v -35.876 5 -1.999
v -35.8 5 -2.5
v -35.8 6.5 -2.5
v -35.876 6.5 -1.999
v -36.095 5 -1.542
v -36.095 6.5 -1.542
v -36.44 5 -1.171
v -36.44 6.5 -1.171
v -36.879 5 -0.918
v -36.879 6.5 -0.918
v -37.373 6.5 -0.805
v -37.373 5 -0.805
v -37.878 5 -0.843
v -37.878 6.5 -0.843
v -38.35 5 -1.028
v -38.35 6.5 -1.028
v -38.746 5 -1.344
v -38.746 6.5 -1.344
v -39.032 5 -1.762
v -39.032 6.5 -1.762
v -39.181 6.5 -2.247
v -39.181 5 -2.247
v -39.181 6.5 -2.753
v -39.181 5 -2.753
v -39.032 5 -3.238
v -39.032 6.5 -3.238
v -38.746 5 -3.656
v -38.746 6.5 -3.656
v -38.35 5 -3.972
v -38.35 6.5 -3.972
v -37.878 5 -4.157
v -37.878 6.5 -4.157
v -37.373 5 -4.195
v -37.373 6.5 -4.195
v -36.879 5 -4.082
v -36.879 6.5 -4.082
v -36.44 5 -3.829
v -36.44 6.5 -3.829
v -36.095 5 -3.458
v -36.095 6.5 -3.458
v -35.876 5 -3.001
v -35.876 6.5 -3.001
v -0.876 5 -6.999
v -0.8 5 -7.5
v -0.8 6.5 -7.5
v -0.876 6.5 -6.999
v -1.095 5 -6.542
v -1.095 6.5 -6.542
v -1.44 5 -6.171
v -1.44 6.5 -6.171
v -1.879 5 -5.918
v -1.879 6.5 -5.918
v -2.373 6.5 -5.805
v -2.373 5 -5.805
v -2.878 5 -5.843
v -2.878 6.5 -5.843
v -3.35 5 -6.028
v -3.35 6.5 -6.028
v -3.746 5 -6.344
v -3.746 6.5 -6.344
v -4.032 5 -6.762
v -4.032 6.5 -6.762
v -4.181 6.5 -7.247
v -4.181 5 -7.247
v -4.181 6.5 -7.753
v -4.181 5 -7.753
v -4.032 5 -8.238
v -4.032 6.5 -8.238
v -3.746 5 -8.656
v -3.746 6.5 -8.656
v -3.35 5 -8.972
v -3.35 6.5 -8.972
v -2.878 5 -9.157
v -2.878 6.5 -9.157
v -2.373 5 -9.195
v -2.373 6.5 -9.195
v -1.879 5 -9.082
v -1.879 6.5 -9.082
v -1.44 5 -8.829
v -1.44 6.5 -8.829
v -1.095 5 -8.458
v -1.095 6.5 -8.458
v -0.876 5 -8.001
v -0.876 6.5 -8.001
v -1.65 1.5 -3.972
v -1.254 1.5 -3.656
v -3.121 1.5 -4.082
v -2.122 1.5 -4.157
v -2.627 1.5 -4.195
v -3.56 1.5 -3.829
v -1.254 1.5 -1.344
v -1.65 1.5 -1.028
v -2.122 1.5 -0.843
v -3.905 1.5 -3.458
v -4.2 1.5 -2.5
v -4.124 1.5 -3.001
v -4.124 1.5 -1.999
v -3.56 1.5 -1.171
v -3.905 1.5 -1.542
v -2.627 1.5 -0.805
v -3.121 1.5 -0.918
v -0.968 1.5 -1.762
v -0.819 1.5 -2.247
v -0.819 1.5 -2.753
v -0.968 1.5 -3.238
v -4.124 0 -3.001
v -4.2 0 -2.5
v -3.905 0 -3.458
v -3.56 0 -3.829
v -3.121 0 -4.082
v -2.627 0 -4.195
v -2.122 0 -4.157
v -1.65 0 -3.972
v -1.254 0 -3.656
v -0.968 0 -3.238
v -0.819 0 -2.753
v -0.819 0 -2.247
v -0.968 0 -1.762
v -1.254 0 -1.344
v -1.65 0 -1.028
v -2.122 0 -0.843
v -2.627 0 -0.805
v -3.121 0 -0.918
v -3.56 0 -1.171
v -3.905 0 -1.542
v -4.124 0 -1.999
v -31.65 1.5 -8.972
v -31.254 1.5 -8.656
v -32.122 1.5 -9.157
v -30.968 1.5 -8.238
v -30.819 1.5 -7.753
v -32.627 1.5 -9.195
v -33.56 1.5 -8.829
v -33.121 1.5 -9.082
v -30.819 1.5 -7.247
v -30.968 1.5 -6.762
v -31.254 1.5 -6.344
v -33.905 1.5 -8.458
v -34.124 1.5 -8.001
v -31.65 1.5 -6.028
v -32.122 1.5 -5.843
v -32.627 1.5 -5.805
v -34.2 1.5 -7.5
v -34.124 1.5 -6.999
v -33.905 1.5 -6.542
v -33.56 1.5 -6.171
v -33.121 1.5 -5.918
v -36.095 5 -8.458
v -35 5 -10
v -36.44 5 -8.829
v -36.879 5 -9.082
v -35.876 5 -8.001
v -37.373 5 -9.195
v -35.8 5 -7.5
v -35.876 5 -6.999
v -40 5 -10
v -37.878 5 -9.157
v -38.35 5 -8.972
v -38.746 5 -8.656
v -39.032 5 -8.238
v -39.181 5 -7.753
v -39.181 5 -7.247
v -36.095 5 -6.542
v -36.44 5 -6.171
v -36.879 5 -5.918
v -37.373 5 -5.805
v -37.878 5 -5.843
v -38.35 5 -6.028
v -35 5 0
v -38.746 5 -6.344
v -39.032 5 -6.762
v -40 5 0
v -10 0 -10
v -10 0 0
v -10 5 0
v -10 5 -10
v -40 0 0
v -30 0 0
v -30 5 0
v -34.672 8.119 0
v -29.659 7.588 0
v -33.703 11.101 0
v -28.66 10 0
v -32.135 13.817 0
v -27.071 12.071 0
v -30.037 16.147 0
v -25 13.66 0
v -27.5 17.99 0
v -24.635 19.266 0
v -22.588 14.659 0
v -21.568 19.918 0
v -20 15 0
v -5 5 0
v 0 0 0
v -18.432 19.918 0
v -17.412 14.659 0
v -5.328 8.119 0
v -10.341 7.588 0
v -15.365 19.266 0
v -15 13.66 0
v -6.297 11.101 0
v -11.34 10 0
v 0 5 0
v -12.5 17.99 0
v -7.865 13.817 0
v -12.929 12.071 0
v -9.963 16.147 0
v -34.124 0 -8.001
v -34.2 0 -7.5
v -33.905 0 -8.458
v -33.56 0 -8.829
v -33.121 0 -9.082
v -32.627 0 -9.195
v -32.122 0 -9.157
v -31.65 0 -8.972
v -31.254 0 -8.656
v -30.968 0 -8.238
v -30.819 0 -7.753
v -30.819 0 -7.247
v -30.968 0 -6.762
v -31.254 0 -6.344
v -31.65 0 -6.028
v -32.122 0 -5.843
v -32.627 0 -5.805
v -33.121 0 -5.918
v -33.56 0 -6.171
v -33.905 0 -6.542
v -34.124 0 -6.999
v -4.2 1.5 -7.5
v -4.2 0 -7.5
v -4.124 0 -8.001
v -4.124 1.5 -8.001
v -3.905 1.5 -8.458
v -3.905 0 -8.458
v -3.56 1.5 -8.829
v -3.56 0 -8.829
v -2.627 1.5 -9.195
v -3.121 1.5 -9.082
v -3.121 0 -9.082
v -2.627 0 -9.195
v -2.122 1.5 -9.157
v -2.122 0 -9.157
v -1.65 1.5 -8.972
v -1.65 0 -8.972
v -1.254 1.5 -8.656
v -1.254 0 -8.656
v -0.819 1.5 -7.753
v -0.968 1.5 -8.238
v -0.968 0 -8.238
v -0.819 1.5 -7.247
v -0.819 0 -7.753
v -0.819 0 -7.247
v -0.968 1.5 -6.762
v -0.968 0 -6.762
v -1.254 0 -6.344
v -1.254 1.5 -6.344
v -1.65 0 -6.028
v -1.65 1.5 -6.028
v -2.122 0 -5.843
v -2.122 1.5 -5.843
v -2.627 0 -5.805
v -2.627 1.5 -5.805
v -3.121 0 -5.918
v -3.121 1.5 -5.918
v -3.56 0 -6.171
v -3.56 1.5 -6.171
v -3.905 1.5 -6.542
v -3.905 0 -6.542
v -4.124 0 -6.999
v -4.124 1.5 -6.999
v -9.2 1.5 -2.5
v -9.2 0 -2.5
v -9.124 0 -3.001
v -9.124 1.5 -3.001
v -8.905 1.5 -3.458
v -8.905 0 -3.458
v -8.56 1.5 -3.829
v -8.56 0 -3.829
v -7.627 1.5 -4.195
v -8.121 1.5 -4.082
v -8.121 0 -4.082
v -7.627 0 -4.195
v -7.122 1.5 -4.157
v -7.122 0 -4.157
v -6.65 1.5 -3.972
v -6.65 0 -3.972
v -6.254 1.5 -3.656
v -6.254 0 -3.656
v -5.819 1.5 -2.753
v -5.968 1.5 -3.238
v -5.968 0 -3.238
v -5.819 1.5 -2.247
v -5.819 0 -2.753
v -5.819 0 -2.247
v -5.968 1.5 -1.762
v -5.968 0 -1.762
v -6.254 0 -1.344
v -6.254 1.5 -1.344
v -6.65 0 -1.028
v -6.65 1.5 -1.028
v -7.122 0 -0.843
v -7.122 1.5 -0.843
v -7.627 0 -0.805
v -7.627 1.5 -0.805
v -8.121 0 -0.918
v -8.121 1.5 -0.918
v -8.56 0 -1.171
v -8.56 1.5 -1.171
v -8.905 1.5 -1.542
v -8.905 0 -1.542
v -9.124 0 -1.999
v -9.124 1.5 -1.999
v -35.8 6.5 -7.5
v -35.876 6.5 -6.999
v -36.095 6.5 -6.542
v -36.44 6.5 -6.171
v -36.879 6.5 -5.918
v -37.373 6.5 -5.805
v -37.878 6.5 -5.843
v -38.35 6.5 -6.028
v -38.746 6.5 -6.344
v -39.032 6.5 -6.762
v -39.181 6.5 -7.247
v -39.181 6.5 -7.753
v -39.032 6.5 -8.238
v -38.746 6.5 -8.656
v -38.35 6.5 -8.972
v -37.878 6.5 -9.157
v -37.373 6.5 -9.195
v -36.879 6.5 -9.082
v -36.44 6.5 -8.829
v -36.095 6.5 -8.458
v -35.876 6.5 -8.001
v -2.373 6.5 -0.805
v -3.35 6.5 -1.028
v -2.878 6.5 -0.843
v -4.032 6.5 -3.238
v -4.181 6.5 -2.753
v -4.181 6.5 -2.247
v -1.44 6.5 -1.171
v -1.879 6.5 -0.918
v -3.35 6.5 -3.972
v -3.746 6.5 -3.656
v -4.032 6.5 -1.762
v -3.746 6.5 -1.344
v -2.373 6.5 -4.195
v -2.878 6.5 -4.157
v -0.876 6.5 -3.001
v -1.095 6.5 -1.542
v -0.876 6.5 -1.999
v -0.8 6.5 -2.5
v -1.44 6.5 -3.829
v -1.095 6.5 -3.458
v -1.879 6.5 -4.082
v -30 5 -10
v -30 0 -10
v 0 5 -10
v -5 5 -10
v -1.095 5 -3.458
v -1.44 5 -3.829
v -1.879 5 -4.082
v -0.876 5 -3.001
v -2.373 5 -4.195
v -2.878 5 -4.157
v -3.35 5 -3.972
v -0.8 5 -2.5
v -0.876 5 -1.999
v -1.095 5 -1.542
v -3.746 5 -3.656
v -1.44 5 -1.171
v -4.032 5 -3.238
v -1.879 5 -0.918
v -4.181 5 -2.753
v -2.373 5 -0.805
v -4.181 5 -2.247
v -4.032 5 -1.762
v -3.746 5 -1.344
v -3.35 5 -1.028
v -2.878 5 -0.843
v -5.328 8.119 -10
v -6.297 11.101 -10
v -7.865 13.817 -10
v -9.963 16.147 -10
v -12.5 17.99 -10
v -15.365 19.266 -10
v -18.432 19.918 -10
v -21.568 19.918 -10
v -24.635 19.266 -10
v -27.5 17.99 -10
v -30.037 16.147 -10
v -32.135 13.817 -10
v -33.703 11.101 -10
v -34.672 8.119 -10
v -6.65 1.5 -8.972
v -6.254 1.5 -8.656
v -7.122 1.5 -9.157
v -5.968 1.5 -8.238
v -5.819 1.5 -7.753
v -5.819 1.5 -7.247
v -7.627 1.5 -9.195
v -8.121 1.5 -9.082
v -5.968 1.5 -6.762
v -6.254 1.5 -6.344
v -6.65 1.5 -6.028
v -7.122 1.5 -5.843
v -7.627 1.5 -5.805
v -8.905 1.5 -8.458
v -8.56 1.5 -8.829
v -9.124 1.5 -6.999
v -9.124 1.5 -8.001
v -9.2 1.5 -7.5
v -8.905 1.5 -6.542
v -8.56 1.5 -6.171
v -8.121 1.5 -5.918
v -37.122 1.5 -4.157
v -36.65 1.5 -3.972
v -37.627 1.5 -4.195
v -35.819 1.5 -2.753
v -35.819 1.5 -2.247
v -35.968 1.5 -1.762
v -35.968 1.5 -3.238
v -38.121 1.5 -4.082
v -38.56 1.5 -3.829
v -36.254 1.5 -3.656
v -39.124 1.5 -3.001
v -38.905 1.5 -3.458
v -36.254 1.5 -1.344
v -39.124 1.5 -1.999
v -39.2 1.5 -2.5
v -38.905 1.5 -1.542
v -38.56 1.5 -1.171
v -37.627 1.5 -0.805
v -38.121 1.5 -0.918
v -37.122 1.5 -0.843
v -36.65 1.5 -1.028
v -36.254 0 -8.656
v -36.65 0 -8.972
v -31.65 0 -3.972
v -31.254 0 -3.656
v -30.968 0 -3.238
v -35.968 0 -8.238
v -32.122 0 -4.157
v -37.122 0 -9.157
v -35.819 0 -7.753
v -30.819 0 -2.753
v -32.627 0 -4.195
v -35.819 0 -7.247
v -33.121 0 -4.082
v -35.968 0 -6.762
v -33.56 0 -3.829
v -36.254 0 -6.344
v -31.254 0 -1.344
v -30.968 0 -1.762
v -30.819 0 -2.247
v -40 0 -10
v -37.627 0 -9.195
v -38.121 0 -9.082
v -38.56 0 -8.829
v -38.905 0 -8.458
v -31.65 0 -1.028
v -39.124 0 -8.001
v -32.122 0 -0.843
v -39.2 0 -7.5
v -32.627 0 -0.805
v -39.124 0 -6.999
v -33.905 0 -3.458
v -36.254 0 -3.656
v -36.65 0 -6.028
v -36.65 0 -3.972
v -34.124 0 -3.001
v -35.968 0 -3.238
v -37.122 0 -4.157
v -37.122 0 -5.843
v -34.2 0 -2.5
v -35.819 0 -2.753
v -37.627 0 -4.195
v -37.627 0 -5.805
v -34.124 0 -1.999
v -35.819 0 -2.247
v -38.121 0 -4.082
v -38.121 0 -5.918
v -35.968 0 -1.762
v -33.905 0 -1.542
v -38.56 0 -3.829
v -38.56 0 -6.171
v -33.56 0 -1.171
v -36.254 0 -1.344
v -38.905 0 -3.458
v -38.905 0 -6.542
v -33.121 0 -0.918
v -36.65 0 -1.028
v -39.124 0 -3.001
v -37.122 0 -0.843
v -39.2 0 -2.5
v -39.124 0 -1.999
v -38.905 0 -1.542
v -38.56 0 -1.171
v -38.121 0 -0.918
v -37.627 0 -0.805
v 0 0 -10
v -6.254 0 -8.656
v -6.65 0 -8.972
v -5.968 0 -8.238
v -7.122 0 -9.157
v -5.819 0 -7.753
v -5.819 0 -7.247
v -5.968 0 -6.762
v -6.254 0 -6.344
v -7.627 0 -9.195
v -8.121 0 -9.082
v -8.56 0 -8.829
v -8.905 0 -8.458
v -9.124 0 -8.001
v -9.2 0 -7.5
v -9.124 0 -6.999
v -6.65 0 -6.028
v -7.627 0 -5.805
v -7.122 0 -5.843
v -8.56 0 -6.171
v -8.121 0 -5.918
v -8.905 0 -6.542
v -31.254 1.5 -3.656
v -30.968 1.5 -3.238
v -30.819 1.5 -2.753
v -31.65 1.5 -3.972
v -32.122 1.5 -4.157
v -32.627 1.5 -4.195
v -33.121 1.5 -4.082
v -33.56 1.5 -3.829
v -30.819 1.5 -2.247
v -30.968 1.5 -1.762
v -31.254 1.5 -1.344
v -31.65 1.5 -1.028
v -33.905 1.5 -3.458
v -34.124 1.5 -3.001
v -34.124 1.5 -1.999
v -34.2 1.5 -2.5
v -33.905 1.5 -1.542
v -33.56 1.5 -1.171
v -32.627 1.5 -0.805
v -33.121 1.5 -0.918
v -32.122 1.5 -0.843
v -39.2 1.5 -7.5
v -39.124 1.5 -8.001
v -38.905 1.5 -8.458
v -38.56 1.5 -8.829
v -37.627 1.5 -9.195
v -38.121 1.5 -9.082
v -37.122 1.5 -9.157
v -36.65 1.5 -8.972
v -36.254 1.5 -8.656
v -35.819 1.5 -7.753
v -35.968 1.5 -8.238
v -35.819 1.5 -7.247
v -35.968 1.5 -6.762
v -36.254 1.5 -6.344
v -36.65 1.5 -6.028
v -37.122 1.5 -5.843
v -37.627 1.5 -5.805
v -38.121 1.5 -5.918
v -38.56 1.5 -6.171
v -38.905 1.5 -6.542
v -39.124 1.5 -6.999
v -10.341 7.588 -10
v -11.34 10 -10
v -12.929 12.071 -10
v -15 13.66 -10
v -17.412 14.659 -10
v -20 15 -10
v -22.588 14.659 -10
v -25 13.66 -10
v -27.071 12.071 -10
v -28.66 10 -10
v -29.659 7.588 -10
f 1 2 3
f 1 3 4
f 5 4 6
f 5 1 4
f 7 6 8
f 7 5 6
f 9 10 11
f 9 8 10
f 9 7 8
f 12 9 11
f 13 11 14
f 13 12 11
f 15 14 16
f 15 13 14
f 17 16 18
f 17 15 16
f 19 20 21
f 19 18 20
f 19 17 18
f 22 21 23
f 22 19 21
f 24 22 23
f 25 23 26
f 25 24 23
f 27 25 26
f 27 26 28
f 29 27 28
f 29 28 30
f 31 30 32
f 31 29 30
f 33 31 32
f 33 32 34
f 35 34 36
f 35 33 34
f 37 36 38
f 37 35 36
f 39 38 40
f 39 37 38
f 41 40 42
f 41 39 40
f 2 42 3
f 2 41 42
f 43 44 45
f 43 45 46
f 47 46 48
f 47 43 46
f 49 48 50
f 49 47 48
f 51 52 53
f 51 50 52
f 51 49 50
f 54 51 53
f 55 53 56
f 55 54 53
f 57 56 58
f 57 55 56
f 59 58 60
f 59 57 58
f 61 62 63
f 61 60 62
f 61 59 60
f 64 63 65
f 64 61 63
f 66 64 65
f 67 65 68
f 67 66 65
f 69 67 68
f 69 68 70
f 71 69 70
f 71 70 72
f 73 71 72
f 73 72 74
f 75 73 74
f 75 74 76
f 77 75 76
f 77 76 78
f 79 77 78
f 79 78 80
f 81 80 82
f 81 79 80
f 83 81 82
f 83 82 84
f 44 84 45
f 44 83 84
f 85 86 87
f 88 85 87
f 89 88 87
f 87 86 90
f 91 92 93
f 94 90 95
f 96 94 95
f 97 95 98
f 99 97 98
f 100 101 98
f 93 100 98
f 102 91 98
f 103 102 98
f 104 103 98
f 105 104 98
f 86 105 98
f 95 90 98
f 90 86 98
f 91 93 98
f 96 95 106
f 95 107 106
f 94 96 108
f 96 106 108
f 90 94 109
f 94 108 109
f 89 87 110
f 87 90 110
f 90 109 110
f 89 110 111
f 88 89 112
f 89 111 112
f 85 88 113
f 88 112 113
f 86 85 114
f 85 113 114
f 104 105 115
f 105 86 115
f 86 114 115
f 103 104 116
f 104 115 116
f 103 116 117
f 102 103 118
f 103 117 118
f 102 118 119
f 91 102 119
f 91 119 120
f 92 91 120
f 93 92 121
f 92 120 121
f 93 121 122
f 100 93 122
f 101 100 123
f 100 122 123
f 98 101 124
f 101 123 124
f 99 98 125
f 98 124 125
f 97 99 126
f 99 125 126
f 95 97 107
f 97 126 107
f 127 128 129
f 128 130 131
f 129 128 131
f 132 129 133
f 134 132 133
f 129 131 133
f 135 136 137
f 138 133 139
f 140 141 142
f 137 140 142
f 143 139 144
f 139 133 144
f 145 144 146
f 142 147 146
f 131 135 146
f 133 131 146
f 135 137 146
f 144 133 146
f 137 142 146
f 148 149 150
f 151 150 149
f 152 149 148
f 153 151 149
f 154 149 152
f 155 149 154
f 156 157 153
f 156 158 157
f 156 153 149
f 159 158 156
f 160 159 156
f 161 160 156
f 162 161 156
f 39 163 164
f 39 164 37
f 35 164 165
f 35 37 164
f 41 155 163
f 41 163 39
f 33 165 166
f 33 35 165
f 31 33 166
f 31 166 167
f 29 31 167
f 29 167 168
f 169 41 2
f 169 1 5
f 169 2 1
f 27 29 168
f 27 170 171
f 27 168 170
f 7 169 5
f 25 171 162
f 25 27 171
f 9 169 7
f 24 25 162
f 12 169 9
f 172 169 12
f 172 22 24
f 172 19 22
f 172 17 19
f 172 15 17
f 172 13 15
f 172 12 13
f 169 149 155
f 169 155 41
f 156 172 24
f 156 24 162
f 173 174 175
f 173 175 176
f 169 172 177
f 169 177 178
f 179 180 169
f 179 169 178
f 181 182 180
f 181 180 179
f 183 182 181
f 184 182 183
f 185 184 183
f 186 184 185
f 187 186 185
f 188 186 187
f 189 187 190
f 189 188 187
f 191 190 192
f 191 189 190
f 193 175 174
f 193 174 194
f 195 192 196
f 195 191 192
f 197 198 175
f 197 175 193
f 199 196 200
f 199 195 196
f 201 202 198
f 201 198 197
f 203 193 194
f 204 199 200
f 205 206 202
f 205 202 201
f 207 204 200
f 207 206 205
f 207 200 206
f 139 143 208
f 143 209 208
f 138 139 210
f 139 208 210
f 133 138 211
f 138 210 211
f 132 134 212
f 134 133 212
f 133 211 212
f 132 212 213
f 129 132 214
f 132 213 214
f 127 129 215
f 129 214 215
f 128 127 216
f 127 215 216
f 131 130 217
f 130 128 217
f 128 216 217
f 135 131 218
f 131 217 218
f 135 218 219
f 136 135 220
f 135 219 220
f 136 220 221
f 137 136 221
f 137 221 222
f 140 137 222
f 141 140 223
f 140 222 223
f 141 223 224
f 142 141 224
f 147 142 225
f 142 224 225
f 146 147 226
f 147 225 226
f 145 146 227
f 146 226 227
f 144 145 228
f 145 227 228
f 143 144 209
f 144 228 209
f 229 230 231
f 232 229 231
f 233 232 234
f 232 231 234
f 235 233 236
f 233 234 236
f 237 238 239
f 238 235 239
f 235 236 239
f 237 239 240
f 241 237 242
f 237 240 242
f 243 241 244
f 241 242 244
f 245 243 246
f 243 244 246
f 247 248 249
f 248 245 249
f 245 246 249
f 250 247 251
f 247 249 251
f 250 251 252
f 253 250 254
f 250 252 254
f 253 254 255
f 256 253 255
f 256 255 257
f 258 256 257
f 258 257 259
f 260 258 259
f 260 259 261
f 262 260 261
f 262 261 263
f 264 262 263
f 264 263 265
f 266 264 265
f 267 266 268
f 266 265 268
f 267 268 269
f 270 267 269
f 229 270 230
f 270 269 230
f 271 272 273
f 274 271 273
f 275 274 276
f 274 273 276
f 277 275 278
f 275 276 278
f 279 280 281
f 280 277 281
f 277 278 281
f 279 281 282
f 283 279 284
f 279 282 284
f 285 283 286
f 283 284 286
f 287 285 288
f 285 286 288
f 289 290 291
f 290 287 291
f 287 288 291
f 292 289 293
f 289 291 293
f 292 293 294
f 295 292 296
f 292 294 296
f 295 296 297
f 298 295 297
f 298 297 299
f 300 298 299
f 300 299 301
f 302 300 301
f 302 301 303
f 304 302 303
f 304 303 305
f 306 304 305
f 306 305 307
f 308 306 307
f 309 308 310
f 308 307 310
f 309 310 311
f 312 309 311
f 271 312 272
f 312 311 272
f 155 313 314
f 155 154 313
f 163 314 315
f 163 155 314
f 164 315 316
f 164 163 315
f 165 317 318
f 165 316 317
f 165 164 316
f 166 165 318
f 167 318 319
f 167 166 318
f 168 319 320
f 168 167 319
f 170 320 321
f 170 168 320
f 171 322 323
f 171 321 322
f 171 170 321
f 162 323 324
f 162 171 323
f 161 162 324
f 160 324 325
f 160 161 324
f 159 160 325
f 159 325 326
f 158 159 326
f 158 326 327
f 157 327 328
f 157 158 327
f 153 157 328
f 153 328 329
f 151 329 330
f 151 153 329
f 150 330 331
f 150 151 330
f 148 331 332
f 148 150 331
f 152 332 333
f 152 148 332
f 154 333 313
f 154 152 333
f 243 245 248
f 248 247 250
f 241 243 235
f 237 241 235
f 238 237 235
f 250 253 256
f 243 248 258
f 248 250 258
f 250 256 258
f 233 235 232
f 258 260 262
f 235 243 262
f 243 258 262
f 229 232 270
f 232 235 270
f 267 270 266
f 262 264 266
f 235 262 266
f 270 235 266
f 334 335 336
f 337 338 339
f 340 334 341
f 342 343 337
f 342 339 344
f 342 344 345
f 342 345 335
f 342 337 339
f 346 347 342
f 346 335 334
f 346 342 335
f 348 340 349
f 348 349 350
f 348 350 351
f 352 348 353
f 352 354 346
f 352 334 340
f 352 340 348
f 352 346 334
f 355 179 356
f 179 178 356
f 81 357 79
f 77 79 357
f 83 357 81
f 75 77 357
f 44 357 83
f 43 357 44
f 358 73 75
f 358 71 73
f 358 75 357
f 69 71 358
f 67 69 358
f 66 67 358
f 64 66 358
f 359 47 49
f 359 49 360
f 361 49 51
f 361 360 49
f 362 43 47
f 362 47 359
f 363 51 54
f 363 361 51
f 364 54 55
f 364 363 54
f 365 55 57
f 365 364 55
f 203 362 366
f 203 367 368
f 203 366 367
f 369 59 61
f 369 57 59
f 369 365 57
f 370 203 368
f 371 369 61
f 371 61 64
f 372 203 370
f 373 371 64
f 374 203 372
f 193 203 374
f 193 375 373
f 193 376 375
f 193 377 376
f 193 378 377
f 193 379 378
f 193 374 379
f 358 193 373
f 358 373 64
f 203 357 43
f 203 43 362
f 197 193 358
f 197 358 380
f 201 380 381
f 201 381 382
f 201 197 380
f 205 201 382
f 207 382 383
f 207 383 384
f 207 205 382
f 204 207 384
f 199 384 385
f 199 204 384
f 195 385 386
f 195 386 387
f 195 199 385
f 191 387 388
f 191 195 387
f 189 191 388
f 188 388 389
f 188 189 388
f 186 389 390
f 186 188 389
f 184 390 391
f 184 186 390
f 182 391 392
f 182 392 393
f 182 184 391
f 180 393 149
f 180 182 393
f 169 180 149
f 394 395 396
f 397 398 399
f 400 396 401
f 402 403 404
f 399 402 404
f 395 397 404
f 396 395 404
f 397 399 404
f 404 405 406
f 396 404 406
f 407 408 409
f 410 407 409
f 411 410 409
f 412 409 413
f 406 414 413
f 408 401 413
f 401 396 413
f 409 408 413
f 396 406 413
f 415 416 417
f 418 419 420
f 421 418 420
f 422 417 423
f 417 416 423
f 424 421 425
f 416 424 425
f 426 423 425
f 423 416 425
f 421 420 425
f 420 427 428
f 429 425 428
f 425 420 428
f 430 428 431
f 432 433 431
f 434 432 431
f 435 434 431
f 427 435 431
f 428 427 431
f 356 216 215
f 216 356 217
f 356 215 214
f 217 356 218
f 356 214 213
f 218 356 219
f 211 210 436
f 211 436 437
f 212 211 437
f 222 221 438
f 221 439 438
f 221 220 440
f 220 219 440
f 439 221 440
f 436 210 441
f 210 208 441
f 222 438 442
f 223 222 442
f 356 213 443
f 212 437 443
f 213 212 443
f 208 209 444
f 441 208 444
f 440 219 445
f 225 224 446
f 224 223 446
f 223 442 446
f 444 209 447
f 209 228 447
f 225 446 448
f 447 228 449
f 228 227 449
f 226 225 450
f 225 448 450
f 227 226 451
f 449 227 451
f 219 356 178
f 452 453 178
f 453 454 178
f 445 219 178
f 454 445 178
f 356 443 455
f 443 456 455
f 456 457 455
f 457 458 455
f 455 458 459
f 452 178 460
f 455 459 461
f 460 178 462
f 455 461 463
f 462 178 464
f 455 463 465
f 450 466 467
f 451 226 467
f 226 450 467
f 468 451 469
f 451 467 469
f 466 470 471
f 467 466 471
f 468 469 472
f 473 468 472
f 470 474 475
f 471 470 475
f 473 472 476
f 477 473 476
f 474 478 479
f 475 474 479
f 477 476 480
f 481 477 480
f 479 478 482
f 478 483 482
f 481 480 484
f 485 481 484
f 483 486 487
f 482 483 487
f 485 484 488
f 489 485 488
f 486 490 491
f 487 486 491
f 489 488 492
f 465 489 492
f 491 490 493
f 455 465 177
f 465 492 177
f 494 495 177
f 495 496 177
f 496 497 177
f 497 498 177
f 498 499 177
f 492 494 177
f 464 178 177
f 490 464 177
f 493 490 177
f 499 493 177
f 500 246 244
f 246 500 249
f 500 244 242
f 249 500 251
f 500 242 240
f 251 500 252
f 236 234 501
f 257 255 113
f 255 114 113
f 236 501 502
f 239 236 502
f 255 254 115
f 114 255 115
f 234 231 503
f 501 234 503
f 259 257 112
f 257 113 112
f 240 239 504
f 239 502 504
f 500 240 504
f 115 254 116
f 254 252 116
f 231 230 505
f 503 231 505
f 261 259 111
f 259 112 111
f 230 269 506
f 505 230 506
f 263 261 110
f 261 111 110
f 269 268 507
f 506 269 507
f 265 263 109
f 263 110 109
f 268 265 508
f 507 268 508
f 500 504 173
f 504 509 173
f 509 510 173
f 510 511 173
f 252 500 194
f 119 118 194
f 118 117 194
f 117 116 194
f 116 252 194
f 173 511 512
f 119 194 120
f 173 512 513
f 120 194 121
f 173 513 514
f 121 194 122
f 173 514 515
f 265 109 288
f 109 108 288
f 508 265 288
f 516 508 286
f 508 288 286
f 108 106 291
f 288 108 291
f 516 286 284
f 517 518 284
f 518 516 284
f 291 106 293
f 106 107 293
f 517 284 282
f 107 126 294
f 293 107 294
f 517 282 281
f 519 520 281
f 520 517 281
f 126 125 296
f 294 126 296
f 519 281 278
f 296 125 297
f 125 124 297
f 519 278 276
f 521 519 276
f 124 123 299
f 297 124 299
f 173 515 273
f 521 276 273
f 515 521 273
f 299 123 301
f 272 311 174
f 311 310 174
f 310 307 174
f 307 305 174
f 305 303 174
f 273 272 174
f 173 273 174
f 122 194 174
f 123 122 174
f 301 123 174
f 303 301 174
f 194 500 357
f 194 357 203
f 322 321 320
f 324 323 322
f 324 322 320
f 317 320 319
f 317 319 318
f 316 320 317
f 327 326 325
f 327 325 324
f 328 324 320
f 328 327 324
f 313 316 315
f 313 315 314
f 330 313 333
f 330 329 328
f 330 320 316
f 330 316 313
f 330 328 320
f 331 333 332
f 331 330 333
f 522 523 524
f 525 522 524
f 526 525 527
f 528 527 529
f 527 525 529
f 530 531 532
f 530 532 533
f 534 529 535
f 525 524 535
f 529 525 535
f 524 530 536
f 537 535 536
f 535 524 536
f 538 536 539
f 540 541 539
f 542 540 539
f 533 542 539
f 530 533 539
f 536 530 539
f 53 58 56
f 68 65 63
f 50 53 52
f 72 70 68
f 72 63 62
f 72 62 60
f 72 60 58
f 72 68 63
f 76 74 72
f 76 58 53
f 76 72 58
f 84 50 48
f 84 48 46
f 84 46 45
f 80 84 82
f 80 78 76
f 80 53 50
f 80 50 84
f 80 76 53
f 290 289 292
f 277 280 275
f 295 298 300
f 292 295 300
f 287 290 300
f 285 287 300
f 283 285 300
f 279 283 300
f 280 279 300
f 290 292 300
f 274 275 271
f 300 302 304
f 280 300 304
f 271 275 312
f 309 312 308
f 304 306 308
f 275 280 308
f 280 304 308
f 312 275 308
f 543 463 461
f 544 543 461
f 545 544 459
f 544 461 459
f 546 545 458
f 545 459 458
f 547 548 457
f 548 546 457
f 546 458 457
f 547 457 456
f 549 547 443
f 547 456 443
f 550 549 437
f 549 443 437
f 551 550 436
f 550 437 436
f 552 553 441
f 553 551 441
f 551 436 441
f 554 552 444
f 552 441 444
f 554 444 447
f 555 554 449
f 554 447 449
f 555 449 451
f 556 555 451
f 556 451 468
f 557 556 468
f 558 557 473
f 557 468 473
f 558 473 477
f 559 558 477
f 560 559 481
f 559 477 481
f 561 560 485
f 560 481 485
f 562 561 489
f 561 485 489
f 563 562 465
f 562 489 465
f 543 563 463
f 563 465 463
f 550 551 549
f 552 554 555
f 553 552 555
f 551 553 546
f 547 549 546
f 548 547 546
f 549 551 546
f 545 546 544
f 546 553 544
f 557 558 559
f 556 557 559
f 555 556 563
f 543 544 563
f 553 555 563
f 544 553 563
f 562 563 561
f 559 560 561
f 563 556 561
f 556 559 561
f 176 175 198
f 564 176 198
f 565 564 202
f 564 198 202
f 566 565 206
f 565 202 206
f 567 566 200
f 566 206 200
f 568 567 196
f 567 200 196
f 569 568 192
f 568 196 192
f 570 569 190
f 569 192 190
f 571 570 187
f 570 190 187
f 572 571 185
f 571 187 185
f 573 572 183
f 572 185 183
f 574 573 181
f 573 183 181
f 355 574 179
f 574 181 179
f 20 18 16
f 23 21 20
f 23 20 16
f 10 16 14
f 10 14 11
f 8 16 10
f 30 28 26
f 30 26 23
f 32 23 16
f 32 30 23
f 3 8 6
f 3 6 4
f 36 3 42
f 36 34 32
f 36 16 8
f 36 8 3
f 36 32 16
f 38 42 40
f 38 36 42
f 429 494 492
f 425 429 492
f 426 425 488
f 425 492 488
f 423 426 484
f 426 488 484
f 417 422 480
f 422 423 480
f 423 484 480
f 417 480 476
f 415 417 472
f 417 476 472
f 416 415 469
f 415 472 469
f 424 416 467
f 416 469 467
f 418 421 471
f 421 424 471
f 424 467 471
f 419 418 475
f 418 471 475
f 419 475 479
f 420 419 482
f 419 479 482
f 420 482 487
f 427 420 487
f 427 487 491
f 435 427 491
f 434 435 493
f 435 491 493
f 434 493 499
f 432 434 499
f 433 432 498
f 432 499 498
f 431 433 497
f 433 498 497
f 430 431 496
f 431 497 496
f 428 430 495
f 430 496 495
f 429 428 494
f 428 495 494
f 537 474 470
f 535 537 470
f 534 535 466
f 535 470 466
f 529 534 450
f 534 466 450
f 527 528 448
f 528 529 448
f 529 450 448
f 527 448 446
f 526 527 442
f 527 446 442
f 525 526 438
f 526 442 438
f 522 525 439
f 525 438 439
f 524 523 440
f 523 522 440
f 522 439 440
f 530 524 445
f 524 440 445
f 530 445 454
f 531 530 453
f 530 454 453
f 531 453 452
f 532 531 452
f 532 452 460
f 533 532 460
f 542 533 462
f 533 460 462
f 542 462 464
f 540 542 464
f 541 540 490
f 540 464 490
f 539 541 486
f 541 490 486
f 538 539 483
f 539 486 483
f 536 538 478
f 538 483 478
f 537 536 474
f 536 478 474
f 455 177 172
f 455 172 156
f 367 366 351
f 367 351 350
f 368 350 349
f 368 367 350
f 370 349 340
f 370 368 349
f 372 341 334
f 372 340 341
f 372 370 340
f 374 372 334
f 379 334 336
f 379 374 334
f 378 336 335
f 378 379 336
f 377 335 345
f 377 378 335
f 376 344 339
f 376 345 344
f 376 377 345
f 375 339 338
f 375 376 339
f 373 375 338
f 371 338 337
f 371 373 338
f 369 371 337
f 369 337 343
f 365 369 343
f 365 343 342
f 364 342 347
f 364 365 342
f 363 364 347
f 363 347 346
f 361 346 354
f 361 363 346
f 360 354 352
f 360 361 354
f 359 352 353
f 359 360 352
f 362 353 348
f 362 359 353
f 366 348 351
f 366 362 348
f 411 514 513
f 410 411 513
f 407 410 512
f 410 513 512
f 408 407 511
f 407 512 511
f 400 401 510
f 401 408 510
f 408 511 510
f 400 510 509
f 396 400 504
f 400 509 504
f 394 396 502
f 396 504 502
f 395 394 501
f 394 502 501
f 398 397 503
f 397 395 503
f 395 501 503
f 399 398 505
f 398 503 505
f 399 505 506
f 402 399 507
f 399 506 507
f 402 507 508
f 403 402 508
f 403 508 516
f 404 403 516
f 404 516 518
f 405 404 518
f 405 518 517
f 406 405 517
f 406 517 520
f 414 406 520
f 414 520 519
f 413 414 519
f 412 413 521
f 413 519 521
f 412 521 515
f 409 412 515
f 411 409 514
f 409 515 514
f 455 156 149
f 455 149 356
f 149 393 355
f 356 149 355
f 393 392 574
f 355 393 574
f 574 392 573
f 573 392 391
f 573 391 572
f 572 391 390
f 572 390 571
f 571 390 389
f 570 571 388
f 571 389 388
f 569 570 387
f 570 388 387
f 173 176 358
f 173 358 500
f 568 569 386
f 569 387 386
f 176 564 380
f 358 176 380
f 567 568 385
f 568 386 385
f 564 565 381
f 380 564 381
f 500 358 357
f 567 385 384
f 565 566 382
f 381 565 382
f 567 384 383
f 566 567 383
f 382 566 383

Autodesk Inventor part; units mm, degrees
ref_plane "YZ Plane" through (0, 0, 0) normal (1, 0, 0) x (0, 1, 0)
ref_plane "XZ Plane" through (0, 0, 0) normal (0, 1, 0) x (-1, 0, 0)
ref_plane "XY Plane" through (0, 0, 0) normal (0, 0, 1) x (1, 0, 0)
sketch "草圖1" plane through (0, 0, 0) normal (0, 1, 0) x (-1, 0, 0)
  line L0 (0, 0) -> (40, 0)
  line L1 (40, 0) -> (40, -10)
  line L2 (40, -10) -> (0, -10)
  line L3 (0, -10) -> (0, 0)
  line L4 (0, 0) -> (10, 0)
  line L5 (10, 0) -> (10, -10)
  line L6 (10, -10) -> (0, -10)
  line L7 (0, -10) -> (0, 0)
  line L8 (40, 0) -> (30, 0)
  line L9 (30, 0) -> (30, -10)
  line L10 (30, -10) -> (40, -10)
  line L11 (40, -10) -> (40, 0)
  circle A0 centre (7.5, -2.5) radius 1.7
  circle A1 centre (7.5, -7.5) radius 1.7
  circle A2 centre (2.5, -2.5) radius 1.7
  circle A3 centre (2.5, -7.5) radius 1.7
  line L12 (20, 0) -> (20, -10) construction
  circle A4 centre (32.5, -2.5) radius 1.7
  circle A5 centre (32.5, -7.5) radius 1.7
  circle A6 centre (37.5, -2.5) radius 1.7
  circle A7 centre (37.5, -7.5) radius 1.7
  dimension "d0" = 40
  dimension "d1" = 10
  dimension "d2" = 10
  dimension "d3" = 10
  dimension "d4" = 10
  dimension "d5" = 10
  dimension "d6" = 3.4
  dimension "d7" = 2.5
  dimension "d8" = 2.5
  dimension "d11" = 5
  dimension "d14" = 5
extrude "擠出1" add sketch "草圖1" along normal blind 5 contours L0 L5 L2 L3 | L0 L1 L2 L9 | A0 | A1 | A2 | A3 | A4 | A5 | A6 | A7
extrude "擠出2" cut sketch "草圖1" along normal blind 1.5 contours A0 | A1 | A2 | A3 | A4 | A5 | A6 | A7
sketch "草圖2" plane through (0, 0, 0) normal (0, 0, 1) x (1, 0, 0)
  line L0 (-40, 0) -> (-30, 0) projected
  line L1 (-30, 0) -> (-30, 5) projected
  line L2 (-40, 5) -> (-30, 5) projected
  line L3 (-40, 0) -> (-40, 5) projected
  line L4 (-10, 0) -> (0, 0) projected
  line L5 (0, 0) -> (0, 5) projected
  line L6 (-10, 5) -> (0, 5) projected
  line L7 (-10, 0) -> (-10, 5) projected
  line L8 (-30, 5) -> (-10, 5) construction
  line L9 (-10, 0) -> (-10, 5) construction
  arc A0 (-10, 5) -> (-30, 5) centre (-20, 5) ccw
  line L10 (-5.8579, 0) -> (-10, 0) construction
  arc A1 (-5, 5) -> (-35, 5) centre (-20, 5) ccw
  dimension "d21" = 5
extrude "擠出3" add sketch "草圖2" against normal blind 10 contours L2 A1 L6 A0
sketch "草圖3" plane through (0, 5, 0) normal (0, 1, 0) x (1, 0, 0)
  circle A0 centre (-2.5, 7.5) radius 1.7 projected
  point P0 (0, 0)
extrude "擠出4" add sketch "草圖3" along normal blind 1.5
pattern_linear "矩形陣列1" count 2 spacing 5 along (0, 0, 1) count 2 spacing 35 along (-1, 0, 0) of "擠出4"
properties part number "110033226_ipt_40_背流拱橋"
